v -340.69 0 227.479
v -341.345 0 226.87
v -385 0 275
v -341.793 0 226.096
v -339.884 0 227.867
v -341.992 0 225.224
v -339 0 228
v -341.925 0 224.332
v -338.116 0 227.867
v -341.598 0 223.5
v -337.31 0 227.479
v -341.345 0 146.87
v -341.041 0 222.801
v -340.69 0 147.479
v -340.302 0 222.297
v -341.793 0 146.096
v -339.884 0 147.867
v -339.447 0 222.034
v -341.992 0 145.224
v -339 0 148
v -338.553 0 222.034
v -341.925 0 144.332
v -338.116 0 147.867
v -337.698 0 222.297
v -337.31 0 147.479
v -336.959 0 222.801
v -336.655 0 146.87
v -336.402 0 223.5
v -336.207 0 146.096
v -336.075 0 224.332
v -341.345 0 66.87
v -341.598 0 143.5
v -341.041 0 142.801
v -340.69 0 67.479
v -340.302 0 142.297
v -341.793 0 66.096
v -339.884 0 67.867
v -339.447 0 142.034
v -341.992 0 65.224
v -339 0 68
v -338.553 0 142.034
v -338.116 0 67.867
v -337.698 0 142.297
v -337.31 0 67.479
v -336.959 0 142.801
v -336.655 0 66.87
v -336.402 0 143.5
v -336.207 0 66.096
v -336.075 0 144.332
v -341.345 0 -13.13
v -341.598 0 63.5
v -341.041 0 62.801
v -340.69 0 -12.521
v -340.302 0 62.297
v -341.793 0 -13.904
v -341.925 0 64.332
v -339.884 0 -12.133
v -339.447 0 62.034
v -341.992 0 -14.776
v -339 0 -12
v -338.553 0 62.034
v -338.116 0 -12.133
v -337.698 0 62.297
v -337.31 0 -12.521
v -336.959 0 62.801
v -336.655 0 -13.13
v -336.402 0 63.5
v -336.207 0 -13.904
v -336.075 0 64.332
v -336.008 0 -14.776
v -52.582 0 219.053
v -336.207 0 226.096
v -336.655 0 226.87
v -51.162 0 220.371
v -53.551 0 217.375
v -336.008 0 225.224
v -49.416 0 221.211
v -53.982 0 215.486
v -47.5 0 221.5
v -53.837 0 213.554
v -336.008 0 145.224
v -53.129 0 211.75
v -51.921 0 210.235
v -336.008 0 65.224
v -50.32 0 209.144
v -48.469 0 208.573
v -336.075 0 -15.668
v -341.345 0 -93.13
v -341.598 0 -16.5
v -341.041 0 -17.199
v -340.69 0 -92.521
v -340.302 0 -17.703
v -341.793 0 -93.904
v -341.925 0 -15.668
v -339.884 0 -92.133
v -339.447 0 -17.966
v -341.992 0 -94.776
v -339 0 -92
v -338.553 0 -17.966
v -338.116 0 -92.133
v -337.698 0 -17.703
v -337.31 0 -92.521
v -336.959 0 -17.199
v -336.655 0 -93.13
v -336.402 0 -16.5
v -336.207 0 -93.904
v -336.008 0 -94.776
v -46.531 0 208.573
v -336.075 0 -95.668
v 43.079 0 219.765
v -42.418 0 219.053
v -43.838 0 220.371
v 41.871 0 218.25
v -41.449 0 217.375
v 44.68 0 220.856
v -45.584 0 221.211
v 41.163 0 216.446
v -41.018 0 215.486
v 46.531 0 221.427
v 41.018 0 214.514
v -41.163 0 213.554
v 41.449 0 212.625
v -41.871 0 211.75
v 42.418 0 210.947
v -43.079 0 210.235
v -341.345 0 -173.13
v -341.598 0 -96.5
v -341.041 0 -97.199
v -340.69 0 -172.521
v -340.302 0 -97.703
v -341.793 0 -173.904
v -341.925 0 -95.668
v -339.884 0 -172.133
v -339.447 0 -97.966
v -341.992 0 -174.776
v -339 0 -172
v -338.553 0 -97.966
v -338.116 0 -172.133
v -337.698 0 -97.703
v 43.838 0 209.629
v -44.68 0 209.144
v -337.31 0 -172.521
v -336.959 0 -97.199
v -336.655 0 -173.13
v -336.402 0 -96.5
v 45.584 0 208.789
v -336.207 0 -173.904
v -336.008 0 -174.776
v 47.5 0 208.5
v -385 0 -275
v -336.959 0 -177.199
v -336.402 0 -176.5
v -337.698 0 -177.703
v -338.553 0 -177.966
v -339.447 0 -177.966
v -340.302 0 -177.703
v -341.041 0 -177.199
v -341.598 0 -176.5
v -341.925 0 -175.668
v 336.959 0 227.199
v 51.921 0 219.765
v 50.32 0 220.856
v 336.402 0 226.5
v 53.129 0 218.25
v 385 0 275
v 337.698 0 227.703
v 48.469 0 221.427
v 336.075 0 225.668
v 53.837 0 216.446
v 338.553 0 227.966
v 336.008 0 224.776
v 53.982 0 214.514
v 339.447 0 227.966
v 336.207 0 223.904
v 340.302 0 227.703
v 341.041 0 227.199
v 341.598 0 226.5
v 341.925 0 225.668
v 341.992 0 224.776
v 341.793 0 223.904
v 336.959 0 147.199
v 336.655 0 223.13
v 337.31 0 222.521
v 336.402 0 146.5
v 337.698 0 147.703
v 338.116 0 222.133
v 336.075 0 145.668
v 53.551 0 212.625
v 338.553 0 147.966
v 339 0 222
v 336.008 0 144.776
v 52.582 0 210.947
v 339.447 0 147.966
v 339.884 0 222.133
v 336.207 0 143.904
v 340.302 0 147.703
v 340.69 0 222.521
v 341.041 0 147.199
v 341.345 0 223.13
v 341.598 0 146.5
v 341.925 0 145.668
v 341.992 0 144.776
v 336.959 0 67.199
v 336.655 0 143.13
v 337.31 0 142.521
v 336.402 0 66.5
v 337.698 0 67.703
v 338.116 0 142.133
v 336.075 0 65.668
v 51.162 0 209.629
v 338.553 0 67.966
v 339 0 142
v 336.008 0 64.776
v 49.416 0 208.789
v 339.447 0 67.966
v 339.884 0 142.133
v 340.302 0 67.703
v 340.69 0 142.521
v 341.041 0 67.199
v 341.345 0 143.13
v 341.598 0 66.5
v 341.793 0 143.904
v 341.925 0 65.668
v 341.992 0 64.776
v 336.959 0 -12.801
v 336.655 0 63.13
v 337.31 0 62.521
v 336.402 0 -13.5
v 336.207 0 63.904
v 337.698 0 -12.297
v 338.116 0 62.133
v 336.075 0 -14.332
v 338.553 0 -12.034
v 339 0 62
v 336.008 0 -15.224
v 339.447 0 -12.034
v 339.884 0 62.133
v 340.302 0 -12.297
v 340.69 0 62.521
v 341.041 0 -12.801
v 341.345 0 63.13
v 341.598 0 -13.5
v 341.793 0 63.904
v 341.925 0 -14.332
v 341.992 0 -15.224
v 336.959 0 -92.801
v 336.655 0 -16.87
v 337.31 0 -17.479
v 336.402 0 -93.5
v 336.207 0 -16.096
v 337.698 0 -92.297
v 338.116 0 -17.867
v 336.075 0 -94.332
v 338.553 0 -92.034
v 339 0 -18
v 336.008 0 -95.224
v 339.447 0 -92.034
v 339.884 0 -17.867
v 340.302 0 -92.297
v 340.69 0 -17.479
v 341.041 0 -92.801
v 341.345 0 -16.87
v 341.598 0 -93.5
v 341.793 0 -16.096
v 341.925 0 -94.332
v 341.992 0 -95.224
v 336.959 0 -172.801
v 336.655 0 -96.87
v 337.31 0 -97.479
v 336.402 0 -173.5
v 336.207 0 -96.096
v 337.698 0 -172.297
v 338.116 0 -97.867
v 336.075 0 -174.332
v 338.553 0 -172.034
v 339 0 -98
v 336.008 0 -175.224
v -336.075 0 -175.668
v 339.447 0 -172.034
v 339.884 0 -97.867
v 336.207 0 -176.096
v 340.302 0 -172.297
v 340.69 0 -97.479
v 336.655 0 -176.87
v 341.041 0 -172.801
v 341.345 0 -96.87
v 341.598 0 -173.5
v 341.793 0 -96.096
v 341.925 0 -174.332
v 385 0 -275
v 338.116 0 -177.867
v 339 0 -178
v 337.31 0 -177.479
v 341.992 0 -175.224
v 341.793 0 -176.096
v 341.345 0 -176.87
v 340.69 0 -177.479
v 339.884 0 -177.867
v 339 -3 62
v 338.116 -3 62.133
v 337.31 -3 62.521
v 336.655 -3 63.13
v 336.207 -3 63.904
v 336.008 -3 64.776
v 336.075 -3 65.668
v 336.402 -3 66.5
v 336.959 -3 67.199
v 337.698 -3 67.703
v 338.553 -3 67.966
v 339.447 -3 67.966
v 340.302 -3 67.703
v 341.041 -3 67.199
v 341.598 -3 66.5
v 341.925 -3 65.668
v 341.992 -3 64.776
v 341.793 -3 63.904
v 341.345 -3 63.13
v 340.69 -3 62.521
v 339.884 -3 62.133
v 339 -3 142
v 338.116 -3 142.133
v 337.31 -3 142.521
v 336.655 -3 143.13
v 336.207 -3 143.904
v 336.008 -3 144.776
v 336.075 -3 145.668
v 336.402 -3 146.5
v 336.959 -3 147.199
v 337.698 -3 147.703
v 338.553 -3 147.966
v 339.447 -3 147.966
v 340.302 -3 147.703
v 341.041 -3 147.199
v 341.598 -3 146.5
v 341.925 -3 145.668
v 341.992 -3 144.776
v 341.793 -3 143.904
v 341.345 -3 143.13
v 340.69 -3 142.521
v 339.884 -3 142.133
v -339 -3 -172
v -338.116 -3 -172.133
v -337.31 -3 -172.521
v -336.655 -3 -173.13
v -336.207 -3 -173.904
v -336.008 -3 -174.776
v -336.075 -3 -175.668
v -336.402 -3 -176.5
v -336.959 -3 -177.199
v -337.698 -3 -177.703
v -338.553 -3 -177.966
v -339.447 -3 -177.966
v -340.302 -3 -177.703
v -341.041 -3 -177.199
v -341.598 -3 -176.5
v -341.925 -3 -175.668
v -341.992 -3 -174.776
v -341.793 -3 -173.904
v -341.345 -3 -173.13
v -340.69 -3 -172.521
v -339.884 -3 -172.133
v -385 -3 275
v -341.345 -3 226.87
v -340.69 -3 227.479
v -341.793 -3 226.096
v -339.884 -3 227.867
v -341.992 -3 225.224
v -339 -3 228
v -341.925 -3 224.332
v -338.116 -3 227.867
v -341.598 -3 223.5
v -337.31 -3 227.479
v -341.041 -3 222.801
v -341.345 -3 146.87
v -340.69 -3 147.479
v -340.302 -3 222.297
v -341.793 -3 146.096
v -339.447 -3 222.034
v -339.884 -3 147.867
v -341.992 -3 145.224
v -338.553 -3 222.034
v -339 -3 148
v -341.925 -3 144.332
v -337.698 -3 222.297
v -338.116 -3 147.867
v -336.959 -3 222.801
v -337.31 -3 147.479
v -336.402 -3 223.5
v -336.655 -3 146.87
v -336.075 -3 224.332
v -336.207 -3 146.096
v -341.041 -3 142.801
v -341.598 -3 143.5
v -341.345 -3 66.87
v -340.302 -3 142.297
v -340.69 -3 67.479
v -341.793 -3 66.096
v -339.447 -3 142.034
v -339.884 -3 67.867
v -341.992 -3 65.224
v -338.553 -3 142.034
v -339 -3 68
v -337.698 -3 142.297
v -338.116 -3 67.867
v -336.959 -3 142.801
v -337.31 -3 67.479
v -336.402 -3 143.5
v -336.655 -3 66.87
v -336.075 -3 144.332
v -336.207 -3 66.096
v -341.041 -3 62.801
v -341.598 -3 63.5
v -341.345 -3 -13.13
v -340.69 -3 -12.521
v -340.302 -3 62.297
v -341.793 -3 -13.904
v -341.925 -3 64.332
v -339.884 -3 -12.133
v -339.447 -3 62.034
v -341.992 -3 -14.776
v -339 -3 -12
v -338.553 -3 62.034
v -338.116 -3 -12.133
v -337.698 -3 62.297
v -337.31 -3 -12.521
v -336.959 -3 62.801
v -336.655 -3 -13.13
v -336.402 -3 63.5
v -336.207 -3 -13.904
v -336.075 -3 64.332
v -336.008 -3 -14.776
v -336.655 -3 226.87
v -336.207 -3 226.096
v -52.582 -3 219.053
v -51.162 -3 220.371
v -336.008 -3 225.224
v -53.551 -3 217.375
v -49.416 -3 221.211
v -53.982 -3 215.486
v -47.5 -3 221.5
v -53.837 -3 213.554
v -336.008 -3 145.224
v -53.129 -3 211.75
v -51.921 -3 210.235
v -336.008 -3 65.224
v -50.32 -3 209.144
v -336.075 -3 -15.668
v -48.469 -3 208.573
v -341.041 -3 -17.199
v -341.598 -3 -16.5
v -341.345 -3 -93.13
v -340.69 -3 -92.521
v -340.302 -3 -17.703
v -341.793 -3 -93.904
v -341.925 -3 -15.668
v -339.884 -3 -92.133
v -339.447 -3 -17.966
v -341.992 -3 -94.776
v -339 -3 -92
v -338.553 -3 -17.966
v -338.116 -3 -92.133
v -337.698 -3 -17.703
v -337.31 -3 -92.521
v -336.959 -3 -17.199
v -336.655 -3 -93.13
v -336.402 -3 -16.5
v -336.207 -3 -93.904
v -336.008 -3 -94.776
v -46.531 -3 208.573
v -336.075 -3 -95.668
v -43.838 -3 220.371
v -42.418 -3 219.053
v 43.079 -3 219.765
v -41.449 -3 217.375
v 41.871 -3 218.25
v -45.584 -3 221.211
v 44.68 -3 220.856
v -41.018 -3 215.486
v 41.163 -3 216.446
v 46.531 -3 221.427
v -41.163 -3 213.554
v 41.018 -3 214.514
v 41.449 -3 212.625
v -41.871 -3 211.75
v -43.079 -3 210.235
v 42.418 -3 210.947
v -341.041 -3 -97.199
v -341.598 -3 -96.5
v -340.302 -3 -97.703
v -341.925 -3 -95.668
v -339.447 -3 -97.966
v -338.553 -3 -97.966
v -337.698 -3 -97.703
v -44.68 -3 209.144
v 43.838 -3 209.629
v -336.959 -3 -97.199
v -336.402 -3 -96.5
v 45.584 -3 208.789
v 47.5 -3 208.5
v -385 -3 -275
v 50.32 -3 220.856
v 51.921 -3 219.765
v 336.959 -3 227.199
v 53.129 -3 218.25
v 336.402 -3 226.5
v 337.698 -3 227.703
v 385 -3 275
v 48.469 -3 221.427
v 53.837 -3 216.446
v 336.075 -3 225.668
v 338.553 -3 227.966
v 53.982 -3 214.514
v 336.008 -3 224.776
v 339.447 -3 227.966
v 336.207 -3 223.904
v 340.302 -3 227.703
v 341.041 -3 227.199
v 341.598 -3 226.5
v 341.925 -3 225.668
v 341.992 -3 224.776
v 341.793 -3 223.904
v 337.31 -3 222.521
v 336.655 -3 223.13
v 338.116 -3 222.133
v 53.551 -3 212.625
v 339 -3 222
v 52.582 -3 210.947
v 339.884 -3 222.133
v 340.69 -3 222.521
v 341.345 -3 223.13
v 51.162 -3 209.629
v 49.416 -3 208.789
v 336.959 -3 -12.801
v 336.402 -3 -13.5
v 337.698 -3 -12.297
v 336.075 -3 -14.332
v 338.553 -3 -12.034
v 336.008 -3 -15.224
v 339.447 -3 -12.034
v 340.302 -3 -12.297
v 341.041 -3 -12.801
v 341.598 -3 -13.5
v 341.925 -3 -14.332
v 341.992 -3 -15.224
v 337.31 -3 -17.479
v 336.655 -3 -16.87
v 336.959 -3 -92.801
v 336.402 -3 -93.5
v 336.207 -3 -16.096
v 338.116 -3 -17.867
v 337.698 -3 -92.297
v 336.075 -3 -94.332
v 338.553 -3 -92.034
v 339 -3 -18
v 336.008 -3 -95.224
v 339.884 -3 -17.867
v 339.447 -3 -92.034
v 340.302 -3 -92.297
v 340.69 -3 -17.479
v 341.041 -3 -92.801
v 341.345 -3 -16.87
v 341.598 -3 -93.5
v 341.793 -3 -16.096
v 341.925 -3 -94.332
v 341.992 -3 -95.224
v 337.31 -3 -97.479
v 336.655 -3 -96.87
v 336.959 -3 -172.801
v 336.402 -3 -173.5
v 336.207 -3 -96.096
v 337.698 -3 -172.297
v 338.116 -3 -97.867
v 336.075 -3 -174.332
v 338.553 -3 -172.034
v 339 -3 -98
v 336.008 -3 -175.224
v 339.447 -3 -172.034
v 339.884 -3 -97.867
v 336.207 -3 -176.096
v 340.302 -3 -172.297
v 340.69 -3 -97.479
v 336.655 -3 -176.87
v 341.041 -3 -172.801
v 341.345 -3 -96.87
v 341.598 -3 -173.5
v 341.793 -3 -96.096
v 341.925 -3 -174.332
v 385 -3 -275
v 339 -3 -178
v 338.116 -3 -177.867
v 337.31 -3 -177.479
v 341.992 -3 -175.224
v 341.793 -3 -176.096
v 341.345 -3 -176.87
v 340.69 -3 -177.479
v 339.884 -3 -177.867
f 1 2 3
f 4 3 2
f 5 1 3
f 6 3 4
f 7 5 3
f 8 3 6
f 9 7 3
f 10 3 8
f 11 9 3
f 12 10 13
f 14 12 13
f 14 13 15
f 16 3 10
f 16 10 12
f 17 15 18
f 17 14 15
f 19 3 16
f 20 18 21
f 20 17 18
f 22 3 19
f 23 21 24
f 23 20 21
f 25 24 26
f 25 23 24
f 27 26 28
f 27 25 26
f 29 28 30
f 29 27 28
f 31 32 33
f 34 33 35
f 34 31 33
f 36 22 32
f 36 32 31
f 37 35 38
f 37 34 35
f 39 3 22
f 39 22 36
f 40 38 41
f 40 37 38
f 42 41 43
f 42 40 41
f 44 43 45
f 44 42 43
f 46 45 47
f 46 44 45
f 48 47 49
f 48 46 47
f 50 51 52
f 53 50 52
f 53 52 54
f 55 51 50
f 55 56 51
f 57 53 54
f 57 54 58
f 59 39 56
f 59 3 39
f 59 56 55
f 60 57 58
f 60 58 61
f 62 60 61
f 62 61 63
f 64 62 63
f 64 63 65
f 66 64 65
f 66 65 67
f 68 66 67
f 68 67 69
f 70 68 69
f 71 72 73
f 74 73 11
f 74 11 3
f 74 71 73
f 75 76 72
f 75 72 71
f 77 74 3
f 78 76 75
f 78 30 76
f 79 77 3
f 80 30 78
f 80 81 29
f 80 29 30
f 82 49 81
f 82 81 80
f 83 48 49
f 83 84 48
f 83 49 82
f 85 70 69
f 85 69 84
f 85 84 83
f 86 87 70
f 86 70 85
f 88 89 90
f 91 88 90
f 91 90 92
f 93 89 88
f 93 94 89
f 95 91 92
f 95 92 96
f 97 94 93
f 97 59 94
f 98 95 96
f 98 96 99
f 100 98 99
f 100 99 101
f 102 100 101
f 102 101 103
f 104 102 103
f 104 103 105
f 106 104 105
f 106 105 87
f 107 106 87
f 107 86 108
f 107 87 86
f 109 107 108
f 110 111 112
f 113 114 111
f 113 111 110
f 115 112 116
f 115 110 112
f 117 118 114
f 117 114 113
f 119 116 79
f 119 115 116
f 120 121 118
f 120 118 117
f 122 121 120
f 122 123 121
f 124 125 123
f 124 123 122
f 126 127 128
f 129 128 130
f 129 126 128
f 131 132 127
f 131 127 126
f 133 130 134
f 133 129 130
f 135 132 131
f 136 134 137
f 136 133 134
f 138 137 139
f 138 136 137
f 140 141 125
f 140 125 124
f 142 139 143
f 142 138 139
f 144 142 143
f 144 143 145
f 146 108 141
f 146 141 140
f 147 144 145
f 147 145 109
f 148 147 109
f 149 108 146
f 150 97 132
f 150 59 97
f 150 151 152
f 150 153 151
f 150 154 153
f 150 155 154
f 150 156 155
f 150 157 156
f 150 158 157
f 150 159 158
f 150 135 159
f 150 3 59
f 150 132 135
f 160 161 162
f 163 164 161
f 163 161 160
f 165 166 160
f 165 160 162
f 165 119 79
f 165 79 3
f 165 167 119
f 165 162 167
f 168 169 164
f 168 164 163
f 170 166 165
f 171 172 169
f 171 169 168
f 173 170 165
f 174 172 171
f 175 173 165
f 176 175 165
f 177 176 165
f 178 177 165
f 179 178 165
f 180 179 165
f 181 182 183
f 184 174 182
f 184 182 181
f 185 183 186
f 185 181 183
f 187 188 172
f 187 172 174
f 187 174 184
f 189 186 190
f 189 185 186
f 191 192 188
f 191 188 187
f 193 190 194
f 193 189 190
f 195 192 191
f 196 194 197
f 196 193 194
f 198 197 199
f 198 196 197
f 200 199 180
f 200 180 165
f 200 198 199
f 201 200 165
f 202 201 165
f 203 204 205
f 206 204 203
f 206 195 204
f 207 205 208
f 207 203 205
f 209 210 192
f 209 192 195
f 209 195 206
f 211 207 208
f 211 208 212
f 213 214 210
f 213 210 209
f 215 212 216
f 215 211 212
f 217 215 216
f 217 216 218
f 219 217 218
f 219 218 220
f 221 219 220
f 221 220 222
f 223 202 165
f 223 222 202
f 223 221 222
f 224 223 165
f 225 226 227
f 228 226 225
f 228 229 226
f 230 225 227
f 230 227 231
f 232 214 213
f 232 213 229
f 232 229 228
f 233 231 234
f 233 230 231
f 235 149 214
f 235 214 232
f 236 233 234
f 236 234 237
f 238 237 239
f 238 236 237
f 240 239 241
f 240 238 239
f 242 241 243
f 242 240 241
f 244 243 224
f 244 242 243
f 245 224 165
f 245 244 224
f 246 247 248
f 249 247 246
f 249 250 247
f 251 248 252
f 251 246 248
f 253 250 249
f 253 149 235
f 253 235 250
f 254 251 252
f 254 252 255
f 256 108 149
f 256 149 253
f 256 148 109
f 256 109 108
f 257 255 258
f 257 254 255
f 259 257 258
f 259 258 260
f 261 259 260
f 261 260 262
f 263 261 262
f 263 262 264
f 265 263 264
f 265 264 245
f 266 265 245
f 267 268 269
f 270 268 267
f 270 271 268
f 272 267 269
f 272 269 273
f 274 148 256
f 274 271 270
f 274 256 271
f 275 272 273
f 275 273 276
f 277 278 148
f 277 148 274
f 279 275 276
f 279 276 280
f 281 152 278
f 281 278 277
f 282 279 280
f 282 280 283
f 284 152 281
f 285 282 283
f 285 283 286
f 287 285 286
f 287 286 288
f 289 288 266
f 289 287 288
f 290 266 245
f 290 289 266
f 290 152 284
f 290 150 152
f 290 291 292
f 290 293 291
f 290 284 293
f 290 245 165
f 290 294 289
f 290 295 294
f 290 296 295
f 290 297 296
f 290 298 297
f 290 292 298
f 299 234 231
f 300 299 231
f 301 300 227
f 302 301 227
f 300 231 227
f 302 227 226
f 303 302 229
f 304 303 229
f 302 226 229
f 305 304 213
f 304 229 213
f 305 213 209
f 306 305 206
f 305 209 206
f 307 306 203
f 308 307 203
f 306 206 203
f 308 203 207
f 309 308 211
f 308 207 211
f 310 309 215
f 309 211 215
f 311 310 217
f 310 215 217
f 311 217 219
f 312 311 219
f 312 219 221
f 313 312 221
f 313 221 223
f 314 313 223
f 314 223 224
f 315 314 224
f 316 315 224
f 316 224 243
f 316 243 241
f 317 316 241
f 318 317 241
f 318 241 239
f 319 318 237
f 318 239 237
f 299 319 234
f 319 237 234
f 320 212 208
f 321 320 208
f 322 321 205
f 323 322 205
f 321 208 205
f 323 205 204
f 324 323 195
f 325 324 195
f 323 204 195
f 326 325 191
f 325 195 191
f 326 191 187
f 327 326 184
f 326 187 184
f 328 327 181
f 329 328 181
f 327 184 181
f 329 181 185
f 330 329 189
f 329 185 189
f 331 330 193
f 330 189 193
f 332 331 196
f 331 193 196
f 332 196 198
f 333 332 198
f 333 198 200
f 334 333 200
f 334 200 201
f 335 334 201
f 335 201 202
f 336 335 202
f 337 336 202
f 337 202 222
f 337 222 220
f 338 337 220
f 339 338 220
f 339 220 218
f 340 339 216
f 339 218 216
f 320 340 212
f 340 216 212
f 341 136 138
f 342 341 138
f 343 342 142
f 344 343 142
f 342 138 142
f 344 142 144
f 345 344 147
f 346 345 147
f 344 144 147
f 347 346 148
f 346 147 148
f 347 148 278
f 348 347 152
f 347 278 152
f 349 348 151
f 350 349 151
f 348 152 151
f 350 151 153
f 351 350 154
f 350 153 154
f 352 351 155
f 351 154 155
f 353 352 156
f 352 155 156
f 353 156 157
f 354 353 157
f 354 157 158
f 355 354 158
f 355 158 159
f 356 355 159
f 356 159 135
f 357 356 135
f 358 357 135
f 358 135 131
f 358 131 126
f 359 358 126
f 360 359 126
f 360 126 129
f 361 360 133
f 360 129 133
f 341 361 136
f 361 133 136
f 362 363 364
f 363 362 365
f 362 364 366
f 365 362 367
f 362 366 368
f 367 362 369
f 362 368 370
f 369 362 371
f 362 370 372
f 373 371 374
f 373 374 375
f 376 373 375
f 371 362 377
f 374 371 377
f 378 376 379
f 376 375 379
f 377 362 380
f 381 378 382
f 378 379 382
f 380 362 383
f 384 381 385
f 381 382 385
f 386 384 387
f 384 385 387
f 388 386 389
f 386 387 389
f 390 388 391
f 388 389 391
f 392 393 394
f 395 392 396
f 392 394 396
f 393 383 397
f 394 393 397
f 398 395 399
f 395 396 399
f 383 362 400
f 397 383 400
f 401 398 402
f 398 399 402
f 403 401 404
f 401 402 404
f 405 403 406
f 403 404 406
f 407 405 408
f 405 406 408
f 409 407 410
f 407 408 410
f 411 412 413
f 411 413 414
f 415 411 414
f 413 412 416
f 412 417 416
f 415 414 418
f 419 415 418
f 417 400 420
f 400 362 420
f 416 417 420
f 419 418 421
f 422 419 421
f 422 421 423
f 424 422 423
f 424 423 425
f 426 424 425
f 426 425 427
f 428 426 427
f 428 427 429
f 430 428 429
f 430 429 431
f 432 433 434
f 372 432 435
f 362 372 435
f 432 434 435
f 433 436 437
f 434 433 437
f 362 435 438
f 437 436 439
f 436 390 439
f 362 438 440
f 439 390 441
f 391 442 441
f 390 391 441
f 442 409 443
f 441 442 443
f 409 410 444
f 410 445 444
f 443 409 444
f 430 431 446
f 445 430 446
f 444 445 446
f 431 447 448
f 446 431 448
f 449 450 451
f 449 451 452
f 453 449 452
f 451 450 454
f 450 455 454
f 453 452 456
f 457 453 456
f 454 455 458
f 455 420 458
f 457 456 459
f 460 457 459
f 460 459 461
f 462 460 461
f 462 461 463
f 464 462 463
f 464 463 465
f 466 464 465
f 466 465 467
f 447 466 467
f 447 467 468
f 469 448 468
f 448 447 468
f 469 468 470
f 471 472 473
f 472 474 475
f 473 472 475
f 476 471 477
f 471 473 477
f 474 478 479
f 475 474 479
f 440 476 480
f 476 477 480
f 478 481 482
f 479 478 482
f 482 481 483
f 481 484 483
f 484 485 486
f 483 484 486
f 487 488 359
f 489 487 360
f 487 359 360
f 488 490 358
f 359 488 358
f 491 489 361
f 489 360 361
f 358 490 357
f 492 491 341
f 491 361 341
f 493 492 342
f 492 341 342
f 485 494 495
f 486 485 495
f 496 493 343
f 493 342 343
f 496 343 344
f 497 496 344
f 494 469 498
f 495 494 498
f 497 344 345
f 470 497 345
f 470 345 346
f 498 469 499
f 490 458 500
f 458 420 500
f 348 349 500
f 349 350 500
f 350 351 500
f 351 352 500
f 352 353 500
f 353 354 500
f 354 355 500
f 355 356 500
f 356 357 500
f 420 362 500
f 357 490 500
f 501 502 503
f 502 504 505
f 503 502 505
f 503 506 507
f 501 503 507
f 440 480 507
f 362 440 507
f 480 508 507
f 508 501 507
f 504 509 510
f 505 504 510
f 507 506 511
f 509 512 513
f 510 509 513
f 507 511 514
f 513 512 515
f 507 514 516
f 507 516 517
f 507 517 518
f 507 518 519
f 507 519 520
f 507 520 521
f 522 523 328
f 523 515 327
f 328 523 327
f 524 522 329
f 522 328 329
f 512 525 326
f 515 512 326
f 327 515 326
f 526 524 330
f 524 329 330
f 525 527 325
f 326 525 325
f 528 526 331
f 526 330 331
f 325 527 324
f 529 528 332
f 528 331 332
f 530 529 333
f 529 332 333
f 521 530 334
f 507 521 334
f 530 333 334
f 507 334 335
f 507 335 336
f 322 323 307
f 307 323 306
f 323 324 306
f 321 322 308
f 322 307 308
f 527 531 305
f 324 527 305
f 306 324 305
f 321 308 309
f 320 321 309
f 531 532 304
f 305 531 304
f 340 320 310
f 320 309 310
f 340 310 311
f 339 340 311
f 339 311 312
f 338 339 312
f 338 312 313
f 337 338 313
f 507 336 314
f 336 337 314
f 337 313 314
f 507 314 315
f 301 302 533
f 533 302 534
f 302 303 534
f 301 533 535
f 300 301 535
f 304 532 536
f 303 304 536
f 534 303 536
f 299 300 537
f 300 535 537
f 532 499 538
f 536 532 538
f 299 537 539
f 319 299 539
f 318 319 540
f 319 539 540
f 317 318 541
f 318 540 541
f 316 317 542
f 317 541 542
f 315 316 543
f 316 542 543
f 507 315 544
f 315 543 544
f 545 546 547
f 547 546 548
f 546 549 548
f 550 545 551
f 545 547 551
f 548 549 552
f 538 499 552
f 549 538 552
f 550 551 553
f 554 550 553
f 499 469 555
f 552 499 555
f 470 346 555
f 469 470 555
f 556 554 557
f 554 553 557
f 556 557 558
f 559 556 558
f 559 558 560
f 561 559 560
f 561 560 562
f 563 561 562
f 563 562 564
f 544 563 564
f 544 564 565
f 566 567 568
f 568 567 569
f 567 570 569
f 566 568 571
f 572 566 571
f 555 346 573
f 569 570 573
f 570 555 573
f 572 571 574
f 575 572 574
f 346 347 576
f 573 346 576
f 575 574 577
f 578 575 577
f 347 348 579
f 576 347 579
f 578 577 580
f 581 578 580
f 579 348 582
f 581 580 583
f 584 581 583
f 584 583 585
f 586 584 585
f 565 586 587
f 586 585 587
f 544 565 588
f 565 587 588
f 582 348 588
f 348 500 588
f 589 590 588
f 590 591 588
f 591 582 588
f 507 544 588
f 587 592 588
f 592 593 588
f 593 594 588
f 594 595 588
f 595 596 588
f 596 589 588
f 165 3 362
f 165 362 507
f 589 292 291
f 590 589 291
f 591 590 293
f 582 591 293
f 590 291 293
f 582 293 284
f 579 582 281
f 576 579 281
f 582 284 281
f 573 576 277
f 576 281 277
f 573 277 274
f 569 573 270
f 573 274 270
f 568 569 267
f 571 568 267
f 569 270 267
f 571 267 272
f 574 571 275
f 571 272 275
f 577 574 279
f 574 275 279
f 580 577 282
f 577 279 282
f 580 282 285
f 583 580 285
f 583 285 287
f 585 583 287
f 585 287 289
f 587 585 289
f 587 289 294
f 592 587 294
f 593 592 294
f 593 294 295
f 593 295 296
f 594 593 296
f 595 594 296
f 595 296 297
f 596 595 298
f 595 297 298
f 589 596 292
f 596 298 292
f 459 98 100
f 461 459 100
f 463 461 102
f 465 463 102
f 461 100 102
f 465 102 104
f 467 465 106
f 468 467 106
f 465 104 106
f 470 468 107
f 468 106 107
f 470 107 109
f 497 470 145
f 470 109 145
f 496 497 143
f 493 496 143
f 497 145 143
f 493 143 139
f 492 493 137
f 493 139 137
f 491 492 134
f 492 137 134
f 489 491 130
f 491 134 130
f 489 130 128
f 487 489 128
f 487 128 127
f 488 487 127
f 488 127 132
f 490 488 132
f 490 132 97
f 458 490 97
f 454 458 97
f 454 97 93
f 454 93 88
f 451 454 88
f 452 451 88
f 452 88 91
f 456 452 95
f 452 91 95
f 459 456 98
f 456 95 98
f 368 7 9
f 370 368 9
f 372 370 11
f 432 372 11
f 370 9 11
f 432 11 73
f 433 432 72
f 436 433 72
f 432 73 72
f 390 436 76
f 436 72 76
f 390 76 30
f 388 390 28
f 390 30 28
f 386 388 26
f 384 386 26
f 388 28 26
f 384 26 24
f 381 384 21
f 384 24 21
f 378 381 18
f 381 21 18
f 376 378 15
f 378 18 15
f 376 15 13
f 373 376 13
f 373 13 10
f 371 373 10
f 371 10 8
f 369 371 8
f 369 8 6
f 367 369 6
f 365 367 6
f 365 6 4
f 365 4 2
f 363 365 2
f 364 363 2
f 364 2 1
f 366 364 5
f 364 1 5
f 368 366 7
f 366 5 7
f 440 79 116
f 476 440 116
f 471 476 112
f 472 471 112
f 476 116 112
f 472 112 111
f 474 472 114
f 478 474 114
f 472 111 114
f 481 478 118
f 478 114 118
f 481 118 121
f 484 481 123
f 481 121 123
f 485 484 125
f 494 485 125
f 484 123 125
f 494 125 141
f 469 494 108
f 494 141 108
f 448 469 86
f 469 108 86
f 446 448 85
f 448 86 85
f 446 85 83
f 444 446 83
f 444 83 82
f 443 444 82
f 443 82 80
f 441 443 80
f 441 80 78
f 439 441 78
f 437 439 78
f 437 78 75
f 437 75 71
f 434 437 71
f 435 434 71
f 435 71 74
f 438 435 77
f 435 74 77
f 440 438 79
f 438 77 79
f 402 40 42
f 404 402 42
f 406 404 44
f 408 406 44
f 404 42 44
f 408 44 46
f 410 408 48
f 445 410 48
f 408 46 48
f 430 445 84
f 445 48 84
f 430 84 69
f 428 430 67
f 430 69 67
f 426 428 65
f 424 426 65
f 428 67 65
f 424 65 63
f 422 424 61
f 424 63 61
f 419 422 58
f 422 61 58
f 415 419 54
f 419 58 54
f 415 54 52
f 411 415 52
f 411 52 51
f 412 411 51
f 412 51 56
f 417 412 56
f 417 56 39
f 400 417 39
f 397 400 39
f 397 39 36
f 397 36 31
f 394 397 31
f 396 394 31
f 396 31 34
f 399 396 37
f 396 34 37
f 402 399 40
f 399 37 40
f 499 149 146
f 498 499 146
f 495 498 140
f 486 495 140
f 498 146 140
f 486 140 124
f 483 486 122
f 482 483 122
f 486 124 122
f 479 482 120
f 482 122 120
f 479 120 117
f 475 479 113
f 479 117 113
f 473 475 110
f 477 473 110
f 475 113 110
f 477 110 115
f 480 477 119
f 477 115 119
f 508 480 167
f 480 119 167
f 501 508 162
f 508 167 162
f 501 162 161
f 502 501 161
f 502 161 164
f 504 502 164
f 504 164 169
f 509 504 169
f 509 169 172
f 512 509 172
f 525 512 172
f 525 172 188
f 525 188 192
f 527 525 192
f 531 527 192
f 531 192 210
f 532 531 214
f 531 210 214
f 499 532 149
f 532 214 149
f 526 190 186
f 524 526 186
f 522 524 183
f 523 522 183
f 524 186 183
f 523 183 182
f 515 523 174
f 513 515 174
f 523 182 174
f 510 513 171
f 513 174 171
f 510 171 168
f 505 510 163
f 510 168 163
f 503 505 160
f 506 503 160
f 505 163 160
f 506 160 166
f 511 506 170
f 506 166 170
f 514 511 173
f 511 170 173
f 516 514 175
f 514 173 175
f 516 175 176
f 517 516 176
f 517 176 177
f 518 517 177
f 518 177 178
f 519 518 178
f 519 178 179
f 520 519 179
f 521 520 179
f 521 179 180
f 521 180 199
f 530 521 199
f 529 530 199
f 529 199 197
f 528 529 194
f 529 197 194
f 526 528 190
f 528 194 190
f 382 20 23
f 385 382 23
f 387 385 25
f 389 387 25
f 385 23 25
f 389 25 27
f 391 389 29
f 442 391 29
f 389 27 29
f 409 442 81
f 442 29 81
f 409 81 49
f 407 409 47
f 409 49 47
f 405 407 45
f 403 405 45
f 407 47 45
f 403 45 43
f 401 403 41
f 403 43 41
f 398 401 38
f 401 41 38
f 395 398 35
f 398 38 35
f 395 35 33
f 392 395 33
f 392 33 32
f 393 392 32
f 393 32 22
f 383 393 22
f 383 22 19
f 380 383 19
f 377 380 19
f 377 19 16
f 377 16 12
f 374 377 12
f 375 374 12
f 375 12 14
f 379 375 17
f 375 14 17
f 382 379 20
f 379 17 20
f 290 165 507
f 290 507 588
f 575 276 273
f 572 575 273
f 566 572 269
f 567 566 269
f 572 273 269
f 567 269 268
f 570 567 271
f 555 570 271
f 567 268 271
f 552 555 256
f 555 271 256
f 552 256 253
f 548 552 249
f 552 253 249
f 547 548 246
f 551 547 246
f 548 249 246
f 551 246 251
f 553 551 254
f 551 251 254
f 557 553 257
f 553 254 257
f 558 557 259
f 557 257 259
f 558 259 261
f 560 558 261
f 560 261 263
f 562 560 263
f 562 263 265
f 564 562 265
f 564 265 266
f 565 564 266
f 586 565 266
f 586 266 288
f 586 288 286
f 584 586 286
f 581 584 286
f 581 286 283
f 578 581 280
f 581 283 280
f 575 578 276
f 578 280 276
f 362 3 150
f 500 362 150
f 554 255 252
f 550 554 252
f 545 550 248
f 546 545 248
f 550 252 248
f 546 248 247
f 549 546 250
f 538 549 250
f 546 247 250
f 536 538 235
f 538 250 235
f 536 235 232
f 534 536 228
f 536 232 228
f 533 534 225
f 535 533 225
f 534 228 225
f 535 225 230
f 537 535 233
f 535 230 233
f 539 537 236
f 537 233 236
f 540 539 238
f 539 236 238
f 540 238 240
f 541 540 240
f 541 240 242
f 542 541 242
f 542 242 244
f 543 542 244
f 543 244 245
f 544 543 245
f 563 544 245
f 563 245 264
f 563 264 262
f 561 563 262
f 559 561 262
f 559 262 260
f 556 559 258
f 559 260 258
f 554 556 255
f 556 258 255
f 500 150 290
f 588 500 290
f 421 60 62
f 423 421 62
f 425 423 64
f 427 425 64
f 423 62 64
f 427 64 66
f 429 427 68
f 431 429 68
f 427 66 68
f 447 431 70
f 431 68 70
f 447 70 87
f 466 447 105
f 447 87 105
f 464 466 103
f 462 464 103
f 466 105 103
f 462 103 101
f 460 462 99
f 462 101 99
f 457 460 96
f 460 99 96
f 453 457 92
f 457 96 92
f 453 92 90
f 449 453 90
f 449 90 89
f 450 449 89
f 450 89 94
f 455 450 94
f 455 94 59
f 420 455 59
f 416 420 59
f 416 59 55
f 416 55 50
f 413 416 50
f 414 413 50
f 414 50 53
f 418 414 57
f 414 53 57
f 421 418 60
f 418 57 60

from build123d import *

# Parameters (mm, degrees)
SKETCH1_W          = 770
SKETCH1_H          = 550
SKETCH1_R          = 3
SKETCH1_R_2        = 6.5
BASE_FLANGE1_DEPTH = 3


# Sheet-metal steps are written as plain solids
with BuildPart() as part:
    # Sketch1 → Base-Flange1 (new body)
    with BuildSketch(Plane(origin=(0, 0, 0), x_dir=(1, 0, 0), z_dir=(0, 1, 0))):
        Rectangle(SKETCH1_W, SKETCH1_H)
        with Locations(Location((-339, 175, 0), (0, 0, 270))):
            Circle(SKETCH1_R, mode=Mode.SUBTRACT)
        with Locations(Location((-339, 95, 0), (0, 0, 270))):
            Circle(SKETCH1_R, mode=Mode.SUBTRACT)
        with Locations(Location((-339, 15, 0), (0, 0, 270))):
            Circle(SKETCH1_R, mode=Mode.SUBTRACT)
        with Locations(Location((-339, -65, 0), (0, 0, 270))):
            Circle(SKETCH1_R, mode=Mode.SUBTRACT)
        with Locations(Location((-339, -145, 0), (0, 0, 270))):
            Circle(SKETCH1_R, mode=Mode.SUBTRACT)
        with Locations(Location((-339, -225, 0), (0, 0, 270))):
            Circle(SKETCH1_R, mode=Mode.SUBTRACT)
        with Locations(Location((339, -225, 0), (0, 0, 90))):
            Circle(SKETCH1_R, mode=Mode.SUBTRACT)
        with Locations(Location((339, -145, 0), (0, 0, 90))):
            Circle(SKETCH1_R, mode=Mode.SUBTRACT)
        with Locations(Location((339, -65, 0), (0, 0, 90))):
            Circle(SKETCH1_R, mode=Mode.SUBTRACT)
        with Locations(Location((339, 15, 0), (0, 0, 90))):
            Circle(SKETCH1_R, mode=Mode.SUBTRACT)
        with Locations(Location((339, 95, 0), (0, 0, 90))):
            Circle(SKETCH1_R, mode=Mode.SUBTRACT)
        with Locations(Location((339, 175, 0), (0, 0, 90))):
            Circle(SKETCH1_R, mode=Mode.SUBTRACT)
        with Locations(Location((-47.5, -215, 0), (0, 0, 270))):
            Circle(SKETCH1_R_2, mode=Mode.SUBTRACT)
        with Locations(Location((47.5, -215, 0), (0, 0, 90))):
            Circle(SKETCH1_R_2, mode=Mode.SUBTRACT)
    extrude(amount=-BASE_FLANGE1_DEPTH)


solid = part.part
